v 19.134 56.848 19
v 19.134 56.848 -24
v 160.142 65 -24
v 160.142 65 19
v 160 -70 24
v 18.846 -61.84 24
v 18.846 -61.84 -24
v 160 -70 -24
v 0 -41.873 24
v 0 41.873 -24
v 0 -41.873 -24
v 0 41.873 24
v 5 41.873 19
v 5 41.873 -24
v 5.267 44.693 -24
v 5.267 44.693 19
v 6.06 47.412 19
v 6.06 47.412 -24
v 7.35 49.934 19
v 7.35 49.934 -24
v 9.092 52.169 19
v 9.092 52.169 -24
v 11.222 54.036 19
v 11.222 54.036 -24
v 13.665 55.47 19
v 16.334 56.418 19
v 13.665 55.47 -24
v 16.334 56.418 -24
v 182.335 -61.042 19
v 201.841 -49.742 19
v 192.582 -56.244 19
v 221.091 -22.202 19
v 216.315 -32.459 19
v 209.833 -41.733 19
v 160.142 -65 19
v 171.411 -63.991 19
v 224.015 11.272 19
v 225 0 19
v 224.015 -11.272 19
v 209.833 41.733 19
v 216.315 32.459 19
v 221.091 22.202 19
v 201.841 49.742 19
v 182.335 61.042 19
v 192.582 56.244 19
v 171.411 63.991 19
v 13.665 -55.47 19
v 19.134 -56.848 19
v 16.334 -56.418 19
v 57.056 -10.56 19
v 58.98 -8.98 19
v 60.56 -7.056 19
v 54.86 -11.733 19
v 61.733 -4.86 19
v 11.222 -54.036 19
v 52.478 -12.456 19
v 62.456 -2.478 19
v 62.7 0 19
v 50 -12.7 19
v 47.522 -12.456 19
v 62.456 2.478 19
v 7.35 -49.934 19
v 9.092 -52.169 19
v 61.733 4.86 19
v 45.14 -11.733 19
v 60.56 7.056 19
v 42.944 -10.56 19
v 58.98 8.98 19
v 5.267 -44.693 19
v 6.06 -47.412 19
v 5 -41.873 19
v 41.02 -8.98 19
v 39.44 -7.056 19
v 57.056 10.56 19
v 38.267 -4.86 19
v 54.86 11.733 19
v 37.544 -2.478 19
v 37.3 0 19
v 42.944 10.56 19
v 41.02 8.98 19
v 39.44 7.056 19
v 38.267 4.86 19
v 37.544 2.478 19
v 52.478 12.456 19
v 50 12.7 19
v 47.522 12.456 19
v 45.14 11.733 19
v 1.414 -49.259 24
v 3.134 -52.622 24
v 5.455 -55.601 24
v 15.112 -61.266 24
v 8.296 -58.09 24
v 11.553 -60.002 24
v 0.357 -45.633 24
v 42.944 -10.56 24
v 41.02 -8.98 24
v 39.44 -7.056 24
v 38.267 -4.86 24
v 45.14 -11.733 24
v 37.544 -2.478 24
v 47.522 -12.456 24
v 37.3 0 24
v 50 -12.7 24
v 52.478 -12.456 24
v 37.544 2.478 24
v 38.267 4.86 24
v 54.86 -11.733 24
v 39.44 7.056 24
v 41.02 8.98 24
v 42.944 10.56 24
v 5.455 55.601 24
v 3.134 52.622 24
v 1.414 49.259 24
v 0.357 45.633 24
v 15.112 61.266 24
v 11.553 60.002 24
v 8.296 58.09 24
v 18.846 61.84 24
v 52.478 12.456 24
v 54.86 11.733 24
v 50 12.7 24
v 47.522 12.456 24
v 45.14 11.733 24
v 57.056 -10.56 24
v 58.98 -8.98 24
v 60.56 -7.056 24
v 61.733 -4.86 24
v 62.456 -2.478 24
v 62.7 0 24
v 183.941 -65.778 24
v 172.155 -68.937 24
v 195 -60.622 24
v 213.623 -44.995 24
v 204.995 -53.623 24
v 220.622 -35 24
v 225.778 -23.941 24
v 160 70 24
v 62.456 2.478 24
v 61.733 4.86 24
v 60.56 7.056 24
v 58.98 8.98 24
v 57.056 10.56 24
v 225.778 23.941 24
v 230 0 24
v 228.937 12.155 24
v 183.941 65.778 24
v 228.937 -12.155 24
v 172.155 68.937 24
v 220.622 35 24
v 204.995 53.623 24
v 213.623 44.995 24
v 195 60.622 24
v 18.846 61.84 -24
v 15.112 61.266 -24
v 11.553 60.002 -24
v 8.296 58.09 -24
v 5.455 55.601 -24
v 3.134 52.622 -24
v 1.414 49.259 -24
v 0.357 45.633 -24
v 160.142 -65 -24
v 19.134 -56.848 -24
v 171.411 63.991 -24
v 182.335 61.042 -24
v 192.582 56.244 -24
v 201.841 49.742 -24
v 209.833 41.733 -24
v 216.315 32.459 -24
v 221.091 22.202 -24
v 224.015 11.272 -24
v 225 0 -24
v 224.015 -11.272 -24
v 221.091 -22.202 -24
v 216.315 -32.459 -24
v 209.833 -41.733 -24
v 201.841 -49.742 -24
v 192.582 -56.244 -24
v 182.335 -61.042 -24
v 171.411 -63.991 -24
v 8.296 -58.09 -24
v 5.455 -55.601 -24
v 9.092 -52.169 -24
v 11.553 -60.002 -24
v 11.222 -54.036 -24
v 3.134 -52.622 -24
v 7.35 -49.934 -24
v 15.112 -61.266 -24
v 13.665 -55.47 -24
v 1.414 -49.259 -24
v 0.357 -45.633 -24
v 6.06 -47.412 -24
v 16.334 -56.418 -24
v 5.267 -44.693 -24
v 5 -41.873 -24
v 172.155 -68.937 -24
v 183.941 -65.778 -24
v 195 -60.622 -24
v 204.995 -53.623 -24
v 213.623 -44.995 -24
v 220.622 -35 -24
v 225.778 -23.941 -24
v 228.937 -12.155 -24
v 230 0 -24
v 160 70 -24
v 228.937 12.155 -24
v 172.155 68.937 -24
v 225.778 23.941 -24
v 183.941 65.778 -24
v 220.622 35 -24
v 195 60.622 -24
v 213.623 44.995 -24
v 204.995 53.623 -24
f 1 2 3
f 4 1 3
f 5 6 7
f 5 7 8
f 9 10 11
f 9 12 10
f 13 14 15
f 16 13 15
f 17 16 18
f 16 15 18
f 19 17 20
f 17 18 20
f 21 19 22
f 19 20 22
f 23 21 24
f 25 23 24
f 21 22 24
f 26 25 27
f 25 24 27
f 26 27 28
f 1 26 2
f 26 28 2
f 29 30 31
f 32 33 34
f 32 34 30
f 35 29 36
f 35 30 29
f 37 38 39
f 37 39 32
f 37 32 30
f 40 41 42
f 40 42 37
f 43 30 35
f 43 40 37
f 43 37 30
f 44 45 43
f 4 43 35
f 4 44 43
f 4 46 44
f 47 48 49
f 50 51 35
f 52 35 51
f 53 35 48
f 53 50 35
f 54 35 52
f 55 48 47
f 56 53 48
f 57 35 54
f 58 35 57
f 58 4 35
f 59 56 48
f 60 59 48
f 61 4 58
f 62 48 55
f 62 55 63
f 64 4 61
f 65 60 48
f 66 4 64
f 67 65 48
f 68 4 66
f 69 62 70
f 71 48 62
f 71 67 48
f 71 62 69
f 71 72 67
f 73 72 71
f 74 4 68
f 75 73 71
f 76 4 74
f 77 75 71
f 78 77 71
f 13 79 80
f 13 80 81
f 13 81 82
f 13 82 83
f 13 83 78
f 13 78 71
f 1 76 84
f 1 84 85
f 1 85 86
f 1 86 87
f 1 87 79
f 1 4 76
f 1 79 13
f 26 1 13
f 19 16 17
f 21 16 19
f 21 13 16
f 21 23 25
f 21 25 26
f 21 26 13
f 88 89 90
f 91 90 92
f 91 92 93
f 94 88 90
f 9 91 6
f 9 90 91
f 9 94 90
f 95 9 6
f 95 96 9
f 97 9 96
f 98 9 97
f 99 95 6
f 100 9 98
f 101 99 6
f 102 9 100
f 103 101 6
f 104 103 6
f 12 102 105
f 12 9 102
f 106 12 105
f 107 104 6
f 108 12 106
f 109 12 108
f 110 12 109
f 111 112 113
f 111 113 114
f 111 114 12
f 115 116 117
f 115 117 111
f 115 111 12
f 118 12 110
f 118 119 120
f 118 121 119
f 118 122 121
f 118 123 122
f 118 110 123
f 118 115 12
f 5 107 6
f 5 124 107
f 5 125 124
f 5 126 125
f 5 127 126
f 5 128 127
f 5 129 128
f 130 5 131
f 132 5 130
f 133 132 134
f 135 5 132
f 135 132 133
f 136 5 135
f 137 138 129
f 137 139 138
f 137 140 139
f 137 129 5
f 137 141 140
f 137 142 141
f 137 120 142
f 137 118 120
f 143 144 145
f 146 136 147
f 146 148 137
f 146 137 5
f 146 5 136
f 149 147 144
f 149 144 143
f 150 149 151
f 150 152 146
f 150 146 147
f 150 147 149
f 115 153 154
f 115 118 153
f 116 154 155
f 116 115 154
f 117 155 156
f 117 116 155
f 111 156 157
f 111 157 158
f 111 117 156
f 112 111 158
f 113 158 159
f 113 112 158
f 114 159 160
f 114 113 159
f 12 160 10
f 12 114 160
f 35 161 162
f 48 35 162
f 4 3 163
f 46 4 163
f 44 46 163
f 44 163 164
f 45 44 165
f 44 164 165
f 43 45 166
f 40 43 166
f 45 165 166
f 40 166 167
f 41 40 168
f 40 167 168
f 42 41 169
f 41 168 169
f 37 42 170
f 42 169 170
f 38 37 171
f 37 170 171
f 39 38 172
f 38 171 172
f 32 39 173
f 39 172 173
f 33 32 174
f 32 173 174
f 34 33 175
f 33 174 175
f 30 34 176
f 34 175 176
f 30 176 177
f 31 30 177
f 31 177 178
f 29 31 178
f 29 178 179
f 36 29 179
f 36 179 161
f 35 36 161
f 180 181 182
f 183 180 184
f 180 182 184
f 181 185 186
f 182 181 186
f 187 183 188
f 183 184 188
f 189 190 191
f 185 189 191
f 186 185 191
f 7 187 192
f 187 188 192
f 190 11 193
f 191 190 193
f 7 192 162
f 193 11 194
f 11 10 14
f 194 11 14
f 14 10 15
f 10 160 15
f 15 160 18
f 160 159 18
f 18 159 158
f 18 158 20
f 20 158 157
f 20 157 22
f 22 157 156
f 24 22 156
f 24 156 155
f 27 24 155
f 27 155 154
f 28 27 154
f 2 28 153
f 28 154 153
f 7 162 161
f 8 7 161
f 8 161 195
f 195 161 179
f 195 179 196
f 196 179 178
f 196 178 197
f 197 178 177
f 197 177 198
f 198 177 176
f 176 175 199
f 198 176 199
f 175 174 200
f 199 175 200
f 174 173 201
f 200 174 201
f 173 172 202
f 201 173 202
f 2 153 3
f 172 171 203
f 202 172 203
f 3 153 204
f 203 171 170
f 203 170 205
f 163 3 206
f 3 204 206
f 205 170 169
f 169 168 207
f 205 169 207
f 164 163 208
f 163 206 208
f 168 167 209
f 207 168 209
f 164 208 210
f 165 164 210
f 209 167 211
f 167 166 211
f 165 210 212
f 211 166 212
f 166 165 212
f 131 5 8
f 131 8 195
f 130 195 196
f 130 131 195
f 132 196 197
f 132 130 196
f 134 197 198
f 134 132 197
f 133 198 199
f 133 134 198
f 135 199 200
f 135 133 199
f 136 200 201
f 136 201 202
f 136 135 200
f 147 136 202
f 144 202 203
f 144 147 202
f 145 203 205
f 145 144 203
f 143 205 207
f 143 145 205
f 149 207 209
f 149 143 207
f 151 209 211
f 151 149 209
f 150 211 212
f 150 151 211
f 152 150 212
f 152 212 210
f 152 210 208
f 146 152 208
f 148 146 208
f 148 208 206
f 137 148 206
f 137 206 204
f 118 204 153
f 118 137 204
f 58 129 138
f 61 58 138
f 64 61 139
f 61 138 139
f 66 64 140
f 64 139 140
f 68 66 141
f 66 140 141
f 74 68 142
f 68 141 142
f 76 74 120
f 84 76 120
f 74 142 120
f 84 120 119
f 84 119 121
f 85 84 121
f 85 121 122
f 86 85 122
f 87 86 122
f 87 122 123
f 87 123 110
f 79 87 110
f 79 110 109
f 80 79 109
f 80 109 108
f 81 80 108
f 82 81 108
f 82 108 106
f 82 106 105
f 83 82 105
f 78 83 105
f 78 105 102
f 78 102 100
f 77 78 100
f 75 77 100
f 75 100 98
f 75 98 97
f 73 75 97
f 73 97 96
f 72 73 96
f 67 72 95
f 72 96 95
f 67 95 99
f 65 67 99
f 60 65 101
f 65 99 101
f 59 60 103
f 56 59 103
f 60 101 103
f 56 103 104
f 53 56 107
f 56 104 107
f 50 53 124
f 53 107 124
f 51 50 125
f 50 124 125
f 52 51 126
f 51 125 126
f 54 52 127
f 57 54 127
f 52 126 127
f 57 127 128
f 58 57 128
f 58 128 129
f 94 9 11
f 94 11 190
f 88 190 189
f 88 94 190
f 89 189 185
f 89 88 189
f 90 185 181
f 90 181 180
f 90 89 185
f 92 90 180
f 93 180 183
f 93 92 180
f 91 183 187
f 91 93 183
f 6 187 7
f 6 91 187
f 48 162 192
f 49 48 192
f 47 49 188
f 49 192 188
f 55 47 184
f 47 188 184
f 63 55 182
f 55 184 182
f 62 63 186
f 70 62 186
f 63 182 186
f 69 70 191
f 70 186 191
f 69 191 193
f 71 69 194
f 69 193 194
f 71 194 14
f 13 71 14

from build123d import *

# Parameters (mm, degrees)
BOSS_EXTRUDE1_DEPTH = 24
CUT_EXTRUDE1_DEPTH  = 43
SKETCH7_R           = 12.7
CUT_EXTRUDE4_DEPTH  = 10


with BuildPart() as part:
    # Sketch1 → Boss-Extrude1 (new, symmetric)
    with BuildSketch(Plane.XY):
        with BuildLine():
            Line((0, 41.872855029), (0, -41.872855029))
            ThreePointArc((0, -41.872855029), (5.455474373, -55.600810969), (18.845677428, -61.839515726))
            Line((18.845677428, -61.839515726), (160, -70))
            ThreePointArc((160, -70), (230, 0), (160, 70))
            Line((160, 70), (18.845677428, 61.839515726))
            ThreePointArc((18.845677428, 61.839515726), (5.455474373, 55.600810969), (0, 41.872855029))
        make_face()
    extrude(amount=BOSS_EXTRUDE1_DEPTH, both=True)

    # Sketch2 → Cut-Extrude1 (cut)
    with BuildSketch(Plane(origin=(0, 0, -24), x_dir=(-1, 0, 0), z_dir=(0, 0, -1))):
        with BuildLine():
            Line((-19.134258071, 56.847850552), (-160.141737643, 64.999845465))
            ThreePointArc((-160.141737643, 64.999845465), (-225, 0), (-160.141737643, -64.999845465))
            Line((-160.141737643, -64.999845465), (-19.134258071, -56.847850552))
            ThreePointArc((-19.134258071, -56.847850552), (-9.09160578, -52.168821984), (-5, -41.872855029))
            Line((-5, -41.872855029), (-5, 41.872855029))
            ThreePointArc((-5, 41.872855029), (-9.09160578, 52.168821984), (-19.134258071, 56.847850552))
        make_face()
    extrude(amount=-CUT_EXTRUDE1_DEPTH, mode=Mode.SUBTRACT)

    # Sketch7 → Cut-Extrude4 (cut)
    with BuildSketch(Plane.XY.offset(24)):
        with Locations((50, 0)):
            Circle(SKETCH7_R)
    extrude(amount=-CUT_EXTRUDE4_DEPTH, mode=Mode.SUBTRACT)


solid = part.part
